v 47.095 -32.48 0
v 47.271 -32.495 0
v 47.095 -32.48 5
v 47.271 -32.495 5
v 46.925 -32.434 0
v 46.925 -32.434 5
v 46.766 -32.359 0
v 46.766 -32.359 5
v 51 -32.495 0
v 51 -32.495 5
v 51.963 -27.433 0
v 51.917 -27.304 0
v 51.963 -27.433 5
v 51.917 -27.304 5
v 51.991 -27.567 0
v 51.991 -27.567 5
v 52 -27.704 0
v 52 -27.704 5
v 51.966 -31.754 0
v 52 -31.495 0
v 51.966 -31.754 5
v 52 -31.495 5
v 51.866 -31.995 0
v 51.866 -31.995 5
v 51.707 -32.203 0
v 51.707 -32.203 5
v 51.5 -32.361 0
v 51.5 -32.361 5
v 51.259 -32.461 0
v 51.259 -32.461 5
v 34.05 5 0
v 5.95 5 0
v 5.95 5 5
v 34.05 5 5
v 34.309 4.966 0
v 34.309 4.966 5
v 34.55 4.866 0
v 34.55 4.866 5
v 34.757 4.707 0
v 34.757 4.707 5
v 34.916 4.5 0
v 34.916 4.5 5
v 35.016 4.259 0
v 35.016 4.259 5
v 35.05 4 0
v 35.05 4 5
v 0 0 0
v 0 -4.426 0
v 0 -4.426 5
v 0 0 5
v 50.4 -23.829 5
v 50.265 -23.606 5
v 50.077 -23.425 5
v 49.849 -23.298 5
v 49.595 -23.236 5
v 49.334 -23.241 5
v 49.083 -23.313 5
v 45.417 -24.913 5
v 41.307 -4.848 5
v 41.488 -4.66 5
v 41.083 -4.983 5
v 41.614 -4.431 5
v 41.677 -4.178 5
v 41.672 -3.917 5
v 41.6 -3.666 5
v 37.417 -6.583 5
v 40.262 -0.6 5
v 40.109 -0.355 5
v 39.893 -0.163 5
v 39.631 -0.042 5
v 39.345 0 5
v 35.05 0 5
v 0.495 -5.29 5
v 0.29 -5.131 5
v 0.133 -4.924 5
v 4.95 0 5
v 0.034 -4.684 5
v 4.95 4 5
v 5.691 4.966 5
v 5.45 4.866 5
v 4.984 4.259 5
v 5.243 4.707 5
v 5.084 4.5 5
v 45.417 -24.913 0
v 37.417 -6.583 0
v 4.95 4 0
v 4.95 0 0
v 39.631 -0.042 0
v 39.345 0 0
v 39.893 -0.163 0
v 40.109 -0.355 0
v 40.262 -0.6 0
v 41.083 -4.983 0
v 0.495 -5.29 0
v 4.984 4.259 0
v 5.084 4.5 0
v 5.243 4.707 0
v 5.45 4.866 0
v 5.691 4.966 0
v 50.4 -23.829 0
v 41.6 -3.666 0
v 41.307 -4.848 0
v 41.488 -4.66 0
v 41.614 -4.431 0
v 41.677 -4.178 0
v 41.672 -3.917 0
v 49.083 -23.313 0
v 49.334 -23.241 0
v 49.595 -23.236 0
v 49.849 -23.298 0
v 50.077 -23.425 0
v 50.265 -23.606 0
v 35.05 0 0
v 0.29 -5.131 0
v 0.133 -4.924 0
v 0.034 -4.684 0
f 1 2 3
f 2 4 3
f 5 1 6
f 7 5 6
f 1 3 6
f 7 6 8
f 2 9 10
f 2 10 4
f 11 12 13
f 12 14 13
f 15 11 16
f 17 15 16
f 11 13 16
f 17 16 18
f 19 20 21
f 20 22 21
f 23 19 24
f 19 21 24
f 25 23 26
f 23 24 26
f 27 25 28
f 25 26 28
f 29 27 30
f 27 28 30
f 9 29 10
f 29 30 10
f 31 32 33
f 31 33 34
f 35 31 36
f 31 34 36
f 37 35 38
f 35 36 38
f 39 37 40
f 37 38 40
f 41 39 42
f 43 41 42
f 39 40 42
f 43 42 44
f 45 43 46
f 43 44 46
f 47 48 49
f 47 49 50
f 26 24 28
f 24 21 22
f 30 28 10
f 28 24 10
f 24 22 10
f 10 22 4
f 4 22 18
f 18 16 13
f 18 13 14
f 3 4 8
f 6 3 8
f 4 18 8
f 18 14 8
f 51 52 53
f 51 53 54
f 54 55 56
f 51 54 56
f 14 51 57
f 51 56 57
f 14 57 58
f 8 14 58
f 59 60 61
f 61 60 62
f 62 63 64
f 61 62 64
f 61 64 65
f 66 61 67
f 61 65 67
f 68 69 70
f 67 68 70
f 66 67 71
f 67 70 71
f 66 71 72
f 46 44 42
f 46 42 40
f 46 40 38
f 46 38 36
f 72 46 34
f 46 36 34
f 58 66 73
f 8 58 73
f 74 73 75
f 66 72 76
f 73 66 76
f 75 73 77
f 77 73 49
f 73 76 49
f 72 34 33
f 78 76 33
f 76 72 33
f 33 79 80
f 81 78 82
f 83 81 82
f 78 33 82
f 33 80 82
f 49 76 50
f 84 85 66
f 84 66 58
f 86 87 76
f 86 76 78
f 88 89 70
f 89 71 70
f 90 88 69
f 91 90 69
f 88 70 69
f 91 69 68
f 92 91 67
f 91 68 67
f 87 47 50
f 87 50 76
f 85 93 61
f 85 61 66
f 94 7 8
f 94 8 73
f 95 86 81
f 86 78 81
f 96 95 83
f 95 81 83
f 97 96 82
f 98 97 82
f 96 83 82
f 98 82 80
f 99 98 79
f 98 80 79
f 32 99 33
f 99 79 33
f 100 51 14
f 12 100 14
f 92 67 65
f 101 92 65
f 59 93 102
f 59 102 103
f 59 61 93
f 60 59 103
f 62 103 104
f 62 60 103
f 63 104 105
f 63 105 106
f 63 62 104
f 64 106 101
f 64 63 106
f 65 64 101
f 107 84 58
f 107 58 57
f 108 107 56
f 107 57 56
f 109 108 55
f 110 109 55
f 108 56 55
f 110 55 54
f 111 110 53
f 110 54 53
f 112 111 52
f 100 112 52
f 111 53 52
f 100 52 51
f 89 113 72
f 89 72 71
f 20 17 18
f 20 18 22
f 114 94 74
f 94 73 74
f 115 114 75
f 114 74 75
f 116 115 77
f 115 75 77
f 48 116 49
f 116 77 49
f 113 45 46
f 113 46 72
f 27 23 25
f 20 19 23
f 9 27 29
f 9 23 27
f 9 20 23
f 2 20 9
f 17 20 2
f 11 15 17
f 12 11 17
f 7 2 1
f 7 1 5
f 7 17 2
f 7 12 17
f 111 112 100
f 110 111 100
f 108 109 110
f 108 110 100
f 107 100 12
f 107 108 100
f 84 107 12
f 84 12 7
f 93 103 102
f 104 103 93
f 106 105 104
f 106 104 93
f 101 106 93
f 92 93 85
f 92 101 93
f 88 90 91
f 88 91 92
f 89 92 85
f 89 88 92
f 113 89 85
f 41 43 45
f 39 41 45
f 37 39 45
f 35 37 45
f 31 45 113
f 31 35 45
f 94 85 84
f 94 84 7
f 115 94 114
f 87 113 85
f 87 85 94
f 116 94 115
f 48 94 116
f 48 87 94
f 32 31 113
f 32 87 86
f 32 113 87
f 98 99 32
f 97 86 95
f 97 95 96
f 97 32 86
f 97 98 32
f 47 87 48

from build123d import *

# Parameters (mm, degrees)
BOSS_EXTRUDE1_DEPTH = 5
FILLET1_R           = 1


with BuildPart() as part:
    # Sketch1 → Boss-Extrude1 (new body)
    with BuildSketch(Plane.XY):
        Polygon((42, -4.582575695), (37.417424305, -6.582575695), (45.417424305, -24.912878475), (50, -22.912878475), (52, -27.49545417), (52, -32.49545417), (47, -32.49545417), (0, -5), (0, 0), (4.95, 0), (4.95, 5), (35.05, 5), (35.05, 0), (40, 0), align=None)
    extrude(amount=BOSS_EXTRUDE1_DEPTH)

    # Fillet1
    fillet1_edges = [part.edges().sort_by_distance(p)[0] for p in [
        (4.95, 5, 2.5),
        (35.05, 5, 2.5),
        (40, 0, 2.5),
        (42, -4.582575695, 2.5),
        (50, -22.912878475, 2.5),
        (52, -27.49545417, 2.5),
        (52, -32.49545417, 2.5),
        (47, -32.49545417, 2.5),
        (0, -5, 2.5),
    ]]
    fillet(fillet1_edges, radius=FILLET1_R)


solid = part.part
